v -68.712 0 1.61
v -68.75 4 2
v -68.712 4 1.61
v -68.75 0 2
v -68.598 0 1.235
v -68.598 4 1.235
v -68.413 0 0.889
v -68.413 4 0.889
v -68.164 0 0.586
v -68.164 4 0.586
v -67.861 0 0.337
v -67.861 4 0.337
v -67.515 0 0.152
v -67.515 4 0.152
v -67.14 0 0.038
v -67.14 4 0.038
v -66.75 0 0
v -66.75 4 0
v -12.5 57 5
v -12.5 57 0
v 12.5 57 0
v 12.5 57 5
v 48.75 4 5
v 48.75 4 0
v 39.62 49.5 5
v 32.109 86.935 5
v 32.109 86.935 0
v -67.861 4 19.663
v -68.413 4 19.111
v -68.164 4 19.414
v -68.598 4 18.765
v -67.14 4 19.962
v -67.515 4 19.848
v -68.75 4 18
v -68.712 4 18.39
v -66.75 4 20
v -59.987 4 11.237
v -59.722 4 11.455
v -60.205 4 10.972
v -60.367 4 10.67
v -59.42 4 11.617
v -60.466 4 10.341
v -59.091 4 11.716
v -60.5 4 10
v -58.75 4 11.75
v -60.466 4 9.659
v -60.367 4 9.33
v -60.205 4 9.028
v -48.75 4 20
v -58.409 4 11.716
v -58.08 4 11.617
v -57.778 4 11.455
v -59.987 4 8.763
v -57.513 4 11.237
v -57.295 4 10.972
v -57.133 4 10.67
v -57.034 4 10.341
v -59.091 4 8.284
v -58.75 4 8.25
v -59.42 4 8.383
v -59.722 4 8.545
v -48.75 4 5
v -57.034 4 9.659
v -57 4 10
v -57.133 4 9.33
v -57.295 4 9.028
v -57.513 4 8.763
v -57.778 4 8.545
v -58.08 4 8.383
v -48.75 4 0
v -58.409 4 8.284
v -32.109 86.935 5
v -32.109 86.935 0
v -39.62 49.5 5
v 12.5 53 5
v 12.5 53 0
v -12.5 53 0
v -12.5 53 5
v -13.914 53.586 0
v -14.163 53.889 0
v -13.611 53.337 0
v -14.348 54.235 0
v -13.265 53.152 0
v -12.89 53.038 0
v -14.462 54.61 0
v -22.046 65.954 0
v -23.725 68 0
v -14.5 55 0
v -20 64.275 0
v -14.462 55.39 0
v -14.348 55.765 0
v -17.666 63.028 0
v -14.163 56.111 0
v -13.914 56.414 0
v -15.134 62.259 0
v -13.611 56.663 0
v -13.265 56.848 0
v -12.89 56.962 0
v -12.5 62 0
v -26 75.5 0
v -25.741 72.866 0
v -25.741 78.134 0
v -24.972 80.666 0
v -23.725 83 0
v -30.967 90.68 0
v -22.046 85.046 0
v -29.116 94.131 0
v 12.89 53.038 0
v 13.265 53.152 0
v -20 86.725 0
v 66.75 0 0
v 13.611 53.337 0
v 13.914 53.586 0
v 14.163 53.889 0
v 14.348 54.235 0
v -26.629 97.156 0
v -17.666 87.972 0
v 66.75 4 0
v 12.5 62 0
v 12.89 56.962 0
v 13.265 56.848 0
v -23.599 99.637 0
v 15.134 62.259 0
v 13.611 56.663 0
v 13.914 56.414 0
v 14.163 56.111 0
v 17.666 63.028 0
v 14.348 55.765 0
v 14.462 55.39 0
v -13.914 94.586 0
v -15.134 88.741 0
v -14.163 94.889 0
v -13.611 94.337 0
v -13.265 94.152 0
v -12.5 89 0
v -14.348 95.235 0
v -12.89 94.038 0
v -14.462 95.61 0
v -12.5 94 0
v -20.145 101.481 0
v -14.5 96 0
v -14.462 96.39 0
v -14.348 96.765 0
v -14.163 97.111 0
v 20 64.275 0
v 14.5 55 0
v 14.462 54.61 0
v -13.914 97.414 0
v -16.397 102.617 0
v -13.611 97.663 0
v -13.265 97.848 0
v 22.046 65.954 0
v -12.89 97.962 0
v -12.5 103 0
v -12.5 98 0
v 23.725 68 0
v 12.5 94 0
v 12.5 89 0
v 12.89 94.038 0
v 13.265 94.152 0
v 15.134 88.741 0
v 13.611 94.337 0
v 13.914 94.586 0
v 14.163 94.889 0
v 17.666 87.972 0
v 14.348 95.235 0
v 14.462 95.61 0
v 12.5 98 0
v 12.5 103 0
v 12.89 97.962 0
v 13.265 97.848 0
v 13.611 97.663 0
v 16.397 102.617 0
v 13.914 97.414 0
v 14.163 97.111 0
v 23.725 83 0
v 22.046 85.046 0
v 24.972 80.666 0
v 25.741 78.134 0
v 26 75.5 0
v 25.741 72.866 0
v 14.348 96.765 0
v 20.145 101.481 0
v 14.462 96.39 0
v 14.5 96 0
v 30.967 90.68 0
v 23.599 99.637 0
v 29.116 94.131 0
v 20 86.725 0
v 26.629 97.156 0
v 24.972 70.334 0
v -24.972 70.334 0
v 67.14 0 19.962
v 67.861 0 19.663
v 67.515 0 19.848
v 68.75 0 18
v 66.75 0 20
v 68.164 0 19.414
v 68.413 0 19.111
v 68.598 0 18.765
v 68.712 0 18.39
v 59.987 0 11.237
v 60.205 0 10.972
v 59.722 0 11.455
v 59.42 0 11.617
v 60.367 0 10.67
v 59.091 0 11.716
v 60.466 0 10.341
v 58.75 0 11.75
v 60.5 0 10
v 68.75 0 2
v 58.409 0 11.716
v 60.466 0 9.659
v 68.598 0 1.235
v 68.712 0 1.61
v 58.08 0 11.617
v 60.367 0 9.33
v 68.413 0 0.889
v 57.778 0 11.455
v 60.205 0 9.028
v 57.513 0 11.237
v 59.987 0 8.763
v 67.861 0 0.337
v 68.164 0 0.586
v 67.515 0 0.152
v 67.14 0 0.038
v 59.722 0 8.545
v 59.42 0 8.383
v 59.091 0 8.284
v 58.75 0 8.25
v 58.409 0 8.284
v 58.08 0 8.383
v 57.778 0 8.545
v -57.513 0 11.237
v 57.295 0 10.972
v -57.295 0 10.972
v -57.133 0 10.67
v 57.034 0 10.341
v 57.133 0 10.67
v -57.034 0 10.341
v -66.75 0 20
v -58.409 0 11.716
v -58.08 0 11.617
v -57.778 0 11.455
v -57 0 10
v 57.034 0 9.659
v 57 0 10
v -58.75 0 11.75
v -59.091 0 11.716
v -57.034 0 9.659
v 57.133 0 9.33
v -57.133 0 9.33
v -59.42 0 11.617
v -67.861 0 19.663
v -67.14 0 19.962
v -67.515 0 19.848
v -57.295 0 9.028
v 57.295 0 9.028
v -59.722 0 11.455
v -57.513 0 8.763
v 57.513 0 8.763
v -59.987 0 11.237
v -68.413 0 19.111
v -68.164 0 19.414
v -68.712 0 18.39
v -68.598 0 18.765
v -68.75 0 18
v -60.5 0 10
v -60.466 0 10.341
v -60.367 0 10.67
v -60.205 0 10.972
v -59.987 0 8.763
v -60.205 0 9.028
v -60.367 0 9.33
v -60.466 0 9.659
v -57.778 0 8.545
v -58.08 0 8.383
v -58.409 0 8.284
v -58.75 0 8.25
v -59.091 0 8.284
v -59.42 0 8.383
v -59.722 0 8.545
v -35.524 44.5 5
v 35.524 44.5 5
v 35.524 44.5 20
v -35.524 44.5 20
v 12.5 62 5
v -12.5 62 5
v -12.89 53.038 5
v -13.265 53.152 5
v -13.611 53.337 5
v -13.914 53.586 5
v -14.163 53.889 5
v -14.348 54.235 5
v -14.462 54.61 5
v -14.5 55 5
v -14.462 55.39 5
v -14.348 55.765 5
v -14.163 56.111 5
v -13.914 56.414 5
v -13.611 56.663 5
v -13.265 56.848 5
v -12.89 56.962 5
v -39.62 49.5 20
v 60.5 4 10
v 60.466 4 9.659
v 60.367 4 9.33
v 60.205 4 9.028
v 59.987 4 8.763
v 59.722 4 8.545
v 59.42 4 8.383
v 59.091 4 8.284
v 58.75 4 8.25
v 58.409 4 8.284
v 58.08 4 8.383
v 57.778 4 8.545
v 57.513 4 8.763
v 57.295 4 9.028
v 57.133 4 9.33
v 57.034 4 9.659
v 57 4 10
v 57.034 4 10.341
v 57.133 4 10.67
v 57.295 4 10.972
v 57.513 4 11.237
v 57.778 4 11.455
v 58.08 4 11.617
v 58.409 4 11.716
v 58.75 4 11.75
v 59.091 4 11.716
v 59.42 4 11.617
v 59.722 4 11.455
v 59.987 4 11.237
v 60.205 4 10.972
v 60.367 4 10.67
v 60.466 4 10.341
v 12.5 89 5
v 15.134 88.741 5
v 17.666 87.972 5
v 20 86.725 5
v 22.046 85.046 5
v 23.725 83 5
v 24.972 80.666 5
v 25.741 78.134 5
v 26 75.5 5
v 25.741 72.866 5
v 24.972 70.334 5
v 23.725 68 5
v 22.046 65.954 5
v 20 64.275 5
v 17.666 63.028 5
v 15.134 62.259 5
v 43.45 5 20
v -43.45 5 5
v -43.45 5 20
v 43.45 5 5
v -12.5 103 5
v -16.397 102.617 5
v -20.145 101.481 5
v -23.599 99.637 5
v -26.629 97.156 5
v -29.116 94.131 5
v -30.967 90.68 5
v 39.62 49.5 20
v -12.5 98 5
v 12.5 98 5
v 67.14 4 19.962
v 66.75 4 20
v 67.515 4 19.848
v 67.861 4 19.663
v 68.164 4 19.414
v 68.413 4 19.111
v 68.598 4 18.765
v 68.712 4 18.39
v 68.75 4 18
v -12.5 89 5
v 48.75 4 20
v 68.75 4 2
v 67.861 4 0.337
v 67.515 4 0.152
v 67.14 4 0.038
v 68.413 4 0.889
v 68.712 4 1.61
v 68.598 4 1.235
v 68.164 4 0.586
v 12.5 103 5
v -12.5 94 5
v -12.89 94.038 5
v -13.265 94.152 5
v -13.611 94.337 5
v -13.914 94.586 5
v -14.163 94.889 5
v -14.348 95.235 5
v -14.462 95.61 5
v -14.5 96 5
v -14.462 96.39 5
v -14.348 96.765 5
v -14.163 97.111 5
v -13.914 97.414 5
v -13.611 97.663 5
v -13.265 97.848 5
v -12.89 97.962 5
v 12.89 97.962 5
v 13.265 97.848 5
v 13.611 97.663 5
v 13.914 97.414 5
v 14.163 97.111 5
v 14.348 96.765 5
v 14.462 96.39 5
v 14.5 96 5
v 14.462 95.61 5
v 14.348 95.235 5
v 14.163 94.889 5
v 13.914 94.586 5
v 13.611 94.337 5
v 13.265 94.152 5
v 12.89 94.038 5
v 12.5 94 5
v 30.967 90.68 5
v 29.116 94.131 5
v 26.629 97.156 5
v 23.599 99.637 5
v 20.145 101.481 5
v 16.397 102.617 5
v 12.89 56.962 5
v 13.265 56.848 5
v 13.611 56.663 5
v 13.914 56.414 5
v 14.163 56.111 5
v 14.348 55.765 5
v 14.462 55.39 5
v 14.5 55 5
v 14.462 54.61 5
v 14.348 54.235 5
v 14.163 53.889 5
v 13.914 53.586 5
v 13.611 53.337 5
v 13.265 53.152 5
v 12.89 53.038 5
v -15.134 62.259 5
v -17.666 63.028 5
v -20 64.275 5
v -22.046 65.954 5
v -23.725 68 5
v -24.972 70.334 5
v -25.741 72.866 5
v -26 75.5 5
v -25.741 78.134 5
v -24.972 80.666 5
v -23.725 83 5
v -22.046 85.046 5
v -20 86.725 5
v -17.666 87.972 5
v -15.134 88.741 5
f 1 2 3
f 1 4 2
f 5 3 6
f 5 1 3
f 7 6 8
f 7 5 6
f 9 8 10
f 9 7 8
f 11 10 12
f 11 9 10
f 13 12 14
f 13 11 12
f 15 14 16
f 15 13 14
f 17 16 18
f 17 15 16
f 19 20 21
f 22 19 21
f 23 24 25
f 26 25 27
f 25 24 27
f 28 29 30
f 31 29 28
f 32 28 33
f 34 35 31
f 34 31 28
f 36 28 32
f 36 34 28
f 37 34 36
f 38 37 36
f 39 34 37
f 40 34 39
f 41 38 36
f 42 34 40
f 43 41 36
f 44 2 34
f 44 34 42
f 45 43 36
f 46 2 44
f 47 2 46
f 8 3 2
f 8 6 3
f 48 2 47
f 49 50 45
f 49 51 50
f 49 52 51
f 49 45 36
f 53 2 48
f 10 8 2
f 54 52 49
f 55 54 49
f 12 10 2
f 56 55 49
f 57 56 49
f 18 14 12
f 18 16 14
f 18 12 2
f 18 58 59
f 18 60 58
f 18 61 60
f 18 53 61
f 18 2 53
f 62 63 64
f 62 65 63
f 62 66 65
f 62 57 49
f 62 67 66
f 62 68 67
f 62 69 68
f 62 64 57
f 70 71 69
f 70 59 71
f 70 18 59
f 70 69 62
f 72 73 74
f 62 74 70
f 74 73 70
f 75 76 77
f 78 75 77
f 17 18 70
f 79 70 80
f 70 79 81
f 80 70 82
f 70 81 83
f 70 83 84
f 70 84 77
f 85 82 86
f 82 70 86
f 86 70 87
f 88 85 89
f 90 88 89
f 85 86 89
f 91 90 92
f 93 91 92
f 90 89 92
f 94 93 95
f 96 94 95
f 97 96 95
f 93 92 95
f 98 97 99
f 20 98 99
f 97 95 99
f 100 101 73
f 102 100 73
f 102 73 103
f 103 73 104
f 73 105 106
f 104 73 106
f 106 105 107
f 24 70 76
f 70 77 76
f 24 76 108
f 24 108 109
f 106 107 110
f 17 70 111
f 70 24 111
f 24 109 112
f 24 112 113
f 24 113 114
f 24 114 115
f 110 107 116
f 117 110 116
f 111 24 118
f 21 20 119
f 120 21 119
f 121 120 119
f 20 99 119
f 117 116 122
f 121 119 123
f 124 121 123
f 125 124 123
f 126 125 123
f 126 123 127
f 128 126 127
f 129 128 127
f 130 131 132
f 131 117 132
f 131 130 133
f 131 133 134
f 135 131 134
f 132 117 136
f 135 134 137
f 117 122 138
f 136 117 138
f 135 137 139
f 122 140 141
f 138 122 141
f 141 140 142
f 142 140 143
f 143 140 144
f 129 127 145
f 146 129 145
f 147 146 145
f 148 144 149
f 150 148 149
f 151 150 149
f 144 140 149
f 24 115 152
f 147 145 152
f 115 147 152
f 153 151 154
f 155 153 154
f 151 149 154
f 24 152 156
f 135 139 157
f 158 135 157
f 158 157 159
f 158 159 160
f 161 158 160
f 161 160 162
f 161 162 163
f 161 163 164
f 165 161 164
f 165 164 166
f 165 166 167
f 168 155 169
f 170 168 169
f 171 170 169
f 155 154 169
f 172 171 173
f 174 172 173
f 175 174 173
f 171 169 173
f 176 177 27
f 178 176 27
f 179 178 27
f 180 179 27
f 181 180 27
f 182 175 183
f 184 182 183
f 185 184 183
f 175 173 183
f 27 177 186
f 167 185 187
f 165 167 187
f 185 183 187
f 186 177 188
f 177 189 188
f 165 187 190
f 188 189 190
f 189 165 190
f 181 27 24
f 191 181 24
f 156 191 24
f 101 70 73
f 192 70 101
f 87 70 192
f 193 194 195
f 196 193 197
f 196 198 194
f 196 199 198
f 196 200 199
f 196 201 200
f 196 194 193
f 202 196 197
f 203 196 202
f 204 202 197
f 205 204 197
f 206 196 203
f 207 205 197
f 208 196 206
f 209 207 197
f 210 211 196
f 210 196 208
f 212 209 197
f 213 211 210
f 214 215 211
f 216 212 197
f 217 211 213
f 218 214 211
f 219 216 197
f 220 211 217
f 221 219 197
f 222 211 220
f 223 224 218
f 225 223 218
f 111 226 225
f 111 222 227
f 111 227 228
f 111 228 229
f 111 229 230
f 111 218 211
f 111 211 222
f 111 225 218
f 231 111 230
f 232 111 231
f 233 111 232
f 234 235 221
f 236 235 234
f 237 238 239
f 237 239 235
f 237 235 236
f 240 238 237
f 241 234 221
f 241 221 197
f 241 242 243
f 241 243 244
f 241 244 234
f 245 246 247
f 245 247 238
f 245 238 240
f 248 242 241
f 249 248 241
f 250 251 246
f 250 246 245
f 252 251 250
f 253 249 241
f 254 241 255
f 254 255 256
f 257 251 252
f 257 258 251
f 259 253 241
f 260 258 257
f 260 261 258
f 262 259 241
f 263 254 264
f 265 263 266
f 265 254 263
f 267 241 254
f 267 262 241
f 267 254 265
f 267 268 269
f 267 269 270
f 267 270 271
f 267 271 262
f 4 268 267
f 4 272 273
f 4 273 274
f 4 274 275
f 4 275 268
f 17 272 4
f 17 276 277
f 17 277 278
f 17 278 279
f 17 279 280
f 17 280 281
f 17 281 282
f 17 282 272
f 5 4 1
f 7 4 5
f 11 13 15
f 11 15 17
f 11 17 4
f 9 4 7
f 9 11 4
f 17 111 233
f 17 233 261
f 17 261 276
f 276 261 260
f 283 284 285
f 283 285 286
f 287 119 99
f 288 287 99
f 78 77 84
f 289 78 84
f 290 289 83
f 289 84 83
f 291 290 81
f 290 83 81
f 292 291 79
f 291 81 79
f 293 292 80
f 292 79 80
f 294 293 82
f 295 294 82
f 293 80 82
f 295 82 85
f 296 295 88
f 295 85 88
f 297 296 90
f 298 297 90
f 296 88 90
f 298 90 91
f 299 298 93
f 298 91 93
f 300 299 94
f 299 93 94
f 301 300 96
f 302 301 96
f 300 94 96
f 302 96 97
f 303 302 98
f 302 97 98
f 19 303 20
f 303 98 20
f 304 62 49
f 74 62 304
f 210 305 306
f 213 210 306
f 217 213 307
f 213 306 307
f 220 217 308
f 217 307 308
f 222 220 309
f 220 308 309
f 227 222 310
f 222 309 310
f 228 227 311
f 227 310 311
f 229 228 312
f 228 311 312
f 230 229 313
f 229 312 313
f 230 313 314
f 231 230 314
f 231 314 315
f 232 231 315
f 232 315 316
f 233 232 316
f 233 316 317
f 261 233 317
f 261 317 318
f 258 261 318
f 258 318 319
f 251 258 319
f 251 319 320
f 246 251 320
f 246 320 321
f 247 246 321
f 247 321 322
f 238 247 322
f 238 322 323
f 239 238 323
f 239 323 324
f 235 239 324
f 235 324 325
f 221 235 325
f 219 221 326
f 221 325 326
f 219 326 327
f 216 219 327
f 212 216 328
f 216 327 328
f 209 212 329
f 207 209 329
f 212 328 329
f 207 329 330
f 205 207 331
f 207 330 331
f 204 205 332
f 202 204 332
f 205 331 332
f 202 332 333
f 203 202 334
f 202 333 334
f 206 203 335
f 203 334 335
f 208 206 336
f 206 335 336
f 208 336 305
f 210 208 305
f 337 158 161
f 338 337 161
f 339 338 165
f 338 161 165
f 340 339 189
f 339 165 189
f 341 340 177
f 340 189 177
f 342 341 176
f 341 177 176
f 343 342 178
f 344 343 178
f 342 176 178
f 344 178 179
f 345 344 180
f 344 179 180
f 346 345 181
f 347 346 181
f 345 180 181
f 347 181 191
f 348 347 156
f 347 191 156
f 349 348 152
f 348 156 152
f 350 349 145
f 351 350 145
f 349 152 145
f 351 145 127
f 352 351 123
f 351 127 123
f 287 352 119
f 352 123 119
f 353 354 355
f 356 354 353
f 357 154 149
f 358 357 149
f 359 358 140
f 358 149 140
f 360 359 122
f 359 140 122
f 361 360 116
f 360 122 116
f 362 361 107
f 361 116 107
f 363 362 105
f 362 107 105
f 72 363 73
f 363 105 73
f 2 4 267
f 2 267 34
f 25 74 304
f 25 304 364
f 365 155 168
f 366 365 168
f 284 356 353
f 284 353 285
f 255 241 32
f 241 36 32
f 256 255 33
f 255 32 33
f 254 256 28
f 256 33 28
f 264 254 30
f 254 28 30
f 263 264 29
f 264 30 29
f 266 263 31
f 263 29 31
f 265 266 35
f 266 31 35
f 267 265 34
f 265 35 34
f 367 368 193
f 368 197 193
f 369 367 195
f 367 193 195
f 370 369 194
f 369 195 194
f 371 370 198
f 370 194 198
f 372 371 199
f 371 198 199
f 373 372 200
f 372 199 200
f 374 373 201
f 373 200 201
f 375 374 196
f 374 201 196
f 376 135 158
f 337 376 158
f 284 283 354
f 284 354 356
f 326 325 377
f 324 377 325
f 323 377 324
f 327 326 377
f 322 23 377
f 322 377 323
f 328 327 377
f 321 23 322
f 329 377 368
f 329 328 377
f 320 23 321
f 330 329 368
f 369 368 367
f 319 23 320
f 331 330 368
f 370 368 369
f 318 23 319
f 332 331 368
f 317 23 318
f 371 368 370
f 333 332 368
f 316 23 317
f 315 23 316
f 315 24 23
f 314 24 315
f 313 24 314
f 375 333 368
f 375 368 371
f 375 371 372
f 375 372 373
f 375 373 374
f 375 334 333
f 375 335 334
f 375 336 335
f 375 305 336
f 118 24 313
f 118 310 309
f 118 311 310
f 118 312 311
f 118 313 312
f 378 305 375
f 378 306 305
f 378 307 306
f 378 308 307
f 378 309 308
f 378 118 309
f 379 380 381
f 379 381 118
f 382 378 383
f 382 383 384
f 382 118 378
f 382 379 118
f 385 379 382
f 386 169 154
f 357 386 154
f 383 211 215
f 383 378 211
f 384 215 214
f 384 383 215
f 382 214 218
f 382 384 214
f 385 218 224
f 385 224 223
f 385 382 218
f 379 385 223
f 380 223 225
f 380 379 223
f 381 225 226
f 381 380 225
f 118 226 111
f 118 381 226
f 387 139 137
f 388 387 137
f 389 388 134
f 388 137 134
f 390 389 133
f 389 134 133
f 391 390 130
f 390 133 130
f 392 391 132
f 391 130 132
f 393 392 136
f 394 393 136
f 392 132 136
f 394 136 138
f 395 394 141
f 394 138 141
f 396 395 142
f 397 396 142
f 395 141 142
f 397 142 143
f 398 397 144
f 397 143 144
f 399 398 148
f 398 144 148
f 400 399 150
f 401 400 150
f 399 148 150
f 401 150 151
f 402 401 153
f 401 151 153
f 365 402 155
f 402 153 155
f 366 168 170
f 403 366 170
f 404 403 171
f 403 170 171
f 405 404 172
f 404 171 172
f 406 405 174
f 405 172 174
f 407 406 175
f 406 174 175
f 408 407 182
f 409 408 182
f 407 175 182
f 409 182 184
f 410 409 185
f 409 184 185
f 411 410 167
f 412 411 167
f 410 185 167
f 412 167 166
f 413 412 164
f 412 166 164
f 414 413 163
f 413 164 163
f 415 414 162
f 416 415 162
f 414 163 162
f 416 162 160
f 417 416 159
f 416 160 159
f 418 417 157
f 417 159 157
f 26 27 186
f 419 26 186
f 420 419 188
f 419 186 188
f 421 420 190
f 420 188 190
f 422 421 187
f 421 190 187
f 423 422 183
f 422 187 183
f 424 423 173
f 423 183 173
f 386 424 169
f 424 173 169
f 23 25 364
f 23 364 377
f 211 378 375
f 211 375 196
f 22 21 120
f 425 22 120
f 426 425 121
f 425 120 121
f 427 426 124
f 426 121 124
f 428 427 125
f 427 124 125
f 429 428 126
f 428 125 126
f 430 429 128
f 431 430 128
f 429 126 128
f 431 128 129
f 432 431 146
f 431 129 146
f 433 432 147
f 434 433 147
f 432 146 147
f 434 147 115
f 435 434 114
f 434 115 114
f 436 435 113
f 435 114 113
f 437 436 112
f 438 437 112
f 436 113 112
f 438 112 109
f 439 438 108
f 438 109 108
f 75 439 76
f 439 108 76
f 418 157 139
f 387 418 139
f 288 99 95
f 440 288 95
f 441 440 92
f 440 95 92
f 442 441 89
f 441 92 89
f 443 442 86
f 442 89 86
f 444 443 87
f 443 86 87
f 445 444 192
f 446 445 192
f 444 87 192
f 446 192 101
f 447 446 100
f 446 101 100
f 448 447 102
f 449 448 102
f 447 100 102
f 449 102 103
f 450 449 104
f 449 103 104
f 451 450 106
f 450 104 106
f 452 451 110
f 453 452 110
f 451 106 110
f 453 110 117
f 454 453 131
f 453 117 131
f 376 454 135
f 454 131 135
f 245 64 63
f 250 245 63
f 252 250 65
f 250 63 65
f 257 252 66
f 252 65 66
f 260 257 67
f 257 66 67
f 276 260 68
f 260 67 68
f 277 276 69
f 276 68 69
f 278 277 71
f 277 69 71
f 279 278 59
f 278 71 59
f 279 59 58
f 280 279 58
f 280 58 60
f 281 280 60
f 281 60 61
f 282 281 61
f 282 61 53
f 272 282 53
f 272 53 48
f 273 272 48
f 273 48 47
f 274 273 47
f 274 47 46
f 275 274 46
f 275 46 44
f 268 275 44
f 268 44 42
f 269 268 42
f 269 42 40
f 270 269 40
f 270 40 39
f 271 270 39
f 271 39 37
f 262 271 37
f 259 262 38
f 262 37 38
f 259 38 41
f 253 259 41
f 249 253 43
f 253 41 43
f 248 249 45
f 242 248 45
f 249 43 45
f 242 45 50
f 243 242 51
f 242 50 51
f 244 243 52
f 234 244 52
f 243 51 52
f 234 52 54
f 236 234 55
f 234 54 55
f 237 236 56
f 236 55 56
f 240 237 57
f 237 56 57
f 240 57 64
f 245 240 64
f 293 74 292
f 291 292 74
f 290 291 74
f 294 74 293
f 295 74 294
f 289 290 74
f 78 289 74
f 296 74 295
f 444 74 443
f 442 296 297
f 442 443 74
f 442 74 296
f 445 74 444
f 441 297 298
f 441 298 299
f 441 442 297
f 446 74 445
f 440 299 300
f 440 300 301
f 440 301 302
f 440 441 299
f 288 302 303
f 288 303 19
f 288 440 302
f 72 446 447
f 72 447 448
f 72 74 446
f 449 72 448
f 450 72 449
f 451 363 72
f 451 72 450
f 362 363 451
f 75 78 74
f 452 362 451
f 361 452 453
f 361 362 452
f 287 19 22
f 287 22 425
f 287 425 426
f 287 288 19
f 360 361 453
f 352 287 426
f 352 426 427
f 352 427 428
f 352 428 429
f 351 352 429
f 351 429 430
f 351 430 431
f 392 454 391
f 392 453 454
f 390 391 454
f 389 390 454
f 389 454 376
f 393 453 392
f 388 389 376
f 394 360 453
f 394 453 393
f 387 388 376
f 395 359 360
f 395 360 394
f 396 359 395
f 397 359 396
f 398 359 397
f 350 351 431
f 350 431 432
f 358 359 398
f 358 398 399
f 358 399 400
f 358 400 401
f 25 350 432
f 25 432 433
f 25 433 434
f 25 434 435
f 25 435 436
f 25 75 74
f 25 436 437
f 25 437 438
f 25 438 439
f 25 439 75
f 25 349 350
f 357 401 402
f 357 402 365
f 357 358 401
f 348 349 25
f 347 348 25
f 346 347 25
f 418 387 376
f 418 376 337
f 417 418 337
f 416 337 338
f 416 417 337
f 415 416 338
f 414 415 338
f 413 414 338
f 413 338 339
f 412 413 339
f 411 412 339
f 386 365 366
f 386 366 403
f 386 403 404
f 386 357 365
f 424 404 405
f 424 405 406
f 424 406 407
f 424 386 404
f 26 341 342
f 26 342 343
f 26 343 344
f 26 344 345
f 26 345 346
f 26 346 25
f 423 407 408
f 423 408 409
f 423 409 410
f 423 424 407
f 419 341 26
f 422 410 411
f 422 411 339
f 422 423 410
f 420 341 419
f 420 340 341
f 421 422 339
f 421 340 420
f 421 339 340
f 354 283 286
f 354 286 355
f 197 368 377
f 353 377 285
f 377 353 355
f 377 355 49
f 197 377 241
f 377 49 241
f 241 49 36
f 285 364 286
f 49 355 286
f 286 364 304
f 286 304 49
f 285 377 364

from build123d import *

# Parameters (mm, degrees)
BOSS_EXTRUDE1_DEPTH = 5
BOSS_EXTRUDE2_DEPTH = 15
SKETCH4_R           = 1.75
CUT_EXTRUDE1_DEPTH  = 5
FILLET2_R           = 2


with BuildPart() as part:
    # Sketch1 → Boss-Extrude1 (new body)
    with BuildSketch(Plane.XY):
        with BuildLine():
            Line((-68.75, 0), (68.75, 0))
            Line((68.75, 0), (68.75, 4))
            Line((68.75, 4), (48.75, 4))
            Line((48.75, 4), (32.109157698, 86.934581855))
            ThreePointArc((32.109157698, 86.934581855), (25.174943055, 98.470805362), (12.5, 103))
            Line((12.5, 103), (-12.5, 103))
            ThreePointArc((-12.5, 103), (-25.174943055, 98.470805362), (-32.109157698, 86.934581855))
            Line((-32.109157698, 86.934581855), (-48.75, 4))
            Line((-48.75, 4), (-68.75, 4))
            Line((-68.75, 4), (-68.75, 0))
        make_face()
        with BuildLine():
            Line((-12.5, 98), (12.5, 98))
            ThreePointArc((12.5, 98), (14.5, 96), (12.5, 94))
            Line((12.5, 94), (-12.5, 94))
            ThreePointArc((-12.5, 94), (-14.5, 96), (-12.5, 98))
        make_face(mode=Mode.SUBTRACT)
        with BuildLine():
            Line((-12.5, 89), (12.5, 89))
            ThreePointArc((12.5, 89), (26, 75.5), (12.5, 62))
            Line((12.5, 62), (-12.5, 62))
            ThreePointArc((-12.5, 62), (-26, 75.5), (-12.5, 89))
        make_face(mode=Mode.SUBTRACT)
        with BuildLine():
            Line((-12.5, 57), (12.5, 57))
            ThreePointArc((12.5, 57), (14.5, 55), (12.5, 53))
            Line((12.5, 53), (-12.5, 53))
            ThreePointArc((-12.5, 53), (-14.5, 55), (-12.5, 57))
        make_face(mode=Mode.SUBTRACT)
    extrude(amount=BOSS_EXTRUDE1_DEPTH)

    # Sketch2 → Boss-Extrude2 (add)
    with BuildSketch(Plane.XY.offset(5)):
        Polygon((-39.620414876, 49.5), (39.620414876, 49.5), (48.75, 4), (68.75, 4), (68.75, 0), (-68.75, 0), (-68.75, 4), (-48.75, 4), align=None)
        Polygon((-35.524007883, 44.5), (-43.449691672, 5), (43.449691672, 5), (35.524007883, 44.5), align=None, mode=Mode.SUBTRACT)
    extrude(amount=BOSS_EXTRUDE2_DEPTH)

    # Sketch4 → Cut-Extrude1 (cut, through all)
    with BuildSketch(Plane(origin=(0, 4, 0), x_dir=(1, 0, 0), z_dir=(0, 1, 0))):
        with Locations((-58.75, -10)):
            Circle(SKETCH4_R)
        with Locations((58.75, -10)):
            Circle(SKETCH4_R)
    extrude(amount=-CUT_EXTRUDE1_DEPTH, mode=Mode.SUBTRACT)

    # Fillet2
    fillet2_edges = [part.edges().sort_by_distance(p)[0] for p in [
        (68.75, 2, 0),
        (-68.75, 2, 0),
        (-68.75, 2, 20),
        (68.75, 2, 20),
    ]]
    fillet(fillet2_edges, radius=FILLET2_R)


solid = part.part
